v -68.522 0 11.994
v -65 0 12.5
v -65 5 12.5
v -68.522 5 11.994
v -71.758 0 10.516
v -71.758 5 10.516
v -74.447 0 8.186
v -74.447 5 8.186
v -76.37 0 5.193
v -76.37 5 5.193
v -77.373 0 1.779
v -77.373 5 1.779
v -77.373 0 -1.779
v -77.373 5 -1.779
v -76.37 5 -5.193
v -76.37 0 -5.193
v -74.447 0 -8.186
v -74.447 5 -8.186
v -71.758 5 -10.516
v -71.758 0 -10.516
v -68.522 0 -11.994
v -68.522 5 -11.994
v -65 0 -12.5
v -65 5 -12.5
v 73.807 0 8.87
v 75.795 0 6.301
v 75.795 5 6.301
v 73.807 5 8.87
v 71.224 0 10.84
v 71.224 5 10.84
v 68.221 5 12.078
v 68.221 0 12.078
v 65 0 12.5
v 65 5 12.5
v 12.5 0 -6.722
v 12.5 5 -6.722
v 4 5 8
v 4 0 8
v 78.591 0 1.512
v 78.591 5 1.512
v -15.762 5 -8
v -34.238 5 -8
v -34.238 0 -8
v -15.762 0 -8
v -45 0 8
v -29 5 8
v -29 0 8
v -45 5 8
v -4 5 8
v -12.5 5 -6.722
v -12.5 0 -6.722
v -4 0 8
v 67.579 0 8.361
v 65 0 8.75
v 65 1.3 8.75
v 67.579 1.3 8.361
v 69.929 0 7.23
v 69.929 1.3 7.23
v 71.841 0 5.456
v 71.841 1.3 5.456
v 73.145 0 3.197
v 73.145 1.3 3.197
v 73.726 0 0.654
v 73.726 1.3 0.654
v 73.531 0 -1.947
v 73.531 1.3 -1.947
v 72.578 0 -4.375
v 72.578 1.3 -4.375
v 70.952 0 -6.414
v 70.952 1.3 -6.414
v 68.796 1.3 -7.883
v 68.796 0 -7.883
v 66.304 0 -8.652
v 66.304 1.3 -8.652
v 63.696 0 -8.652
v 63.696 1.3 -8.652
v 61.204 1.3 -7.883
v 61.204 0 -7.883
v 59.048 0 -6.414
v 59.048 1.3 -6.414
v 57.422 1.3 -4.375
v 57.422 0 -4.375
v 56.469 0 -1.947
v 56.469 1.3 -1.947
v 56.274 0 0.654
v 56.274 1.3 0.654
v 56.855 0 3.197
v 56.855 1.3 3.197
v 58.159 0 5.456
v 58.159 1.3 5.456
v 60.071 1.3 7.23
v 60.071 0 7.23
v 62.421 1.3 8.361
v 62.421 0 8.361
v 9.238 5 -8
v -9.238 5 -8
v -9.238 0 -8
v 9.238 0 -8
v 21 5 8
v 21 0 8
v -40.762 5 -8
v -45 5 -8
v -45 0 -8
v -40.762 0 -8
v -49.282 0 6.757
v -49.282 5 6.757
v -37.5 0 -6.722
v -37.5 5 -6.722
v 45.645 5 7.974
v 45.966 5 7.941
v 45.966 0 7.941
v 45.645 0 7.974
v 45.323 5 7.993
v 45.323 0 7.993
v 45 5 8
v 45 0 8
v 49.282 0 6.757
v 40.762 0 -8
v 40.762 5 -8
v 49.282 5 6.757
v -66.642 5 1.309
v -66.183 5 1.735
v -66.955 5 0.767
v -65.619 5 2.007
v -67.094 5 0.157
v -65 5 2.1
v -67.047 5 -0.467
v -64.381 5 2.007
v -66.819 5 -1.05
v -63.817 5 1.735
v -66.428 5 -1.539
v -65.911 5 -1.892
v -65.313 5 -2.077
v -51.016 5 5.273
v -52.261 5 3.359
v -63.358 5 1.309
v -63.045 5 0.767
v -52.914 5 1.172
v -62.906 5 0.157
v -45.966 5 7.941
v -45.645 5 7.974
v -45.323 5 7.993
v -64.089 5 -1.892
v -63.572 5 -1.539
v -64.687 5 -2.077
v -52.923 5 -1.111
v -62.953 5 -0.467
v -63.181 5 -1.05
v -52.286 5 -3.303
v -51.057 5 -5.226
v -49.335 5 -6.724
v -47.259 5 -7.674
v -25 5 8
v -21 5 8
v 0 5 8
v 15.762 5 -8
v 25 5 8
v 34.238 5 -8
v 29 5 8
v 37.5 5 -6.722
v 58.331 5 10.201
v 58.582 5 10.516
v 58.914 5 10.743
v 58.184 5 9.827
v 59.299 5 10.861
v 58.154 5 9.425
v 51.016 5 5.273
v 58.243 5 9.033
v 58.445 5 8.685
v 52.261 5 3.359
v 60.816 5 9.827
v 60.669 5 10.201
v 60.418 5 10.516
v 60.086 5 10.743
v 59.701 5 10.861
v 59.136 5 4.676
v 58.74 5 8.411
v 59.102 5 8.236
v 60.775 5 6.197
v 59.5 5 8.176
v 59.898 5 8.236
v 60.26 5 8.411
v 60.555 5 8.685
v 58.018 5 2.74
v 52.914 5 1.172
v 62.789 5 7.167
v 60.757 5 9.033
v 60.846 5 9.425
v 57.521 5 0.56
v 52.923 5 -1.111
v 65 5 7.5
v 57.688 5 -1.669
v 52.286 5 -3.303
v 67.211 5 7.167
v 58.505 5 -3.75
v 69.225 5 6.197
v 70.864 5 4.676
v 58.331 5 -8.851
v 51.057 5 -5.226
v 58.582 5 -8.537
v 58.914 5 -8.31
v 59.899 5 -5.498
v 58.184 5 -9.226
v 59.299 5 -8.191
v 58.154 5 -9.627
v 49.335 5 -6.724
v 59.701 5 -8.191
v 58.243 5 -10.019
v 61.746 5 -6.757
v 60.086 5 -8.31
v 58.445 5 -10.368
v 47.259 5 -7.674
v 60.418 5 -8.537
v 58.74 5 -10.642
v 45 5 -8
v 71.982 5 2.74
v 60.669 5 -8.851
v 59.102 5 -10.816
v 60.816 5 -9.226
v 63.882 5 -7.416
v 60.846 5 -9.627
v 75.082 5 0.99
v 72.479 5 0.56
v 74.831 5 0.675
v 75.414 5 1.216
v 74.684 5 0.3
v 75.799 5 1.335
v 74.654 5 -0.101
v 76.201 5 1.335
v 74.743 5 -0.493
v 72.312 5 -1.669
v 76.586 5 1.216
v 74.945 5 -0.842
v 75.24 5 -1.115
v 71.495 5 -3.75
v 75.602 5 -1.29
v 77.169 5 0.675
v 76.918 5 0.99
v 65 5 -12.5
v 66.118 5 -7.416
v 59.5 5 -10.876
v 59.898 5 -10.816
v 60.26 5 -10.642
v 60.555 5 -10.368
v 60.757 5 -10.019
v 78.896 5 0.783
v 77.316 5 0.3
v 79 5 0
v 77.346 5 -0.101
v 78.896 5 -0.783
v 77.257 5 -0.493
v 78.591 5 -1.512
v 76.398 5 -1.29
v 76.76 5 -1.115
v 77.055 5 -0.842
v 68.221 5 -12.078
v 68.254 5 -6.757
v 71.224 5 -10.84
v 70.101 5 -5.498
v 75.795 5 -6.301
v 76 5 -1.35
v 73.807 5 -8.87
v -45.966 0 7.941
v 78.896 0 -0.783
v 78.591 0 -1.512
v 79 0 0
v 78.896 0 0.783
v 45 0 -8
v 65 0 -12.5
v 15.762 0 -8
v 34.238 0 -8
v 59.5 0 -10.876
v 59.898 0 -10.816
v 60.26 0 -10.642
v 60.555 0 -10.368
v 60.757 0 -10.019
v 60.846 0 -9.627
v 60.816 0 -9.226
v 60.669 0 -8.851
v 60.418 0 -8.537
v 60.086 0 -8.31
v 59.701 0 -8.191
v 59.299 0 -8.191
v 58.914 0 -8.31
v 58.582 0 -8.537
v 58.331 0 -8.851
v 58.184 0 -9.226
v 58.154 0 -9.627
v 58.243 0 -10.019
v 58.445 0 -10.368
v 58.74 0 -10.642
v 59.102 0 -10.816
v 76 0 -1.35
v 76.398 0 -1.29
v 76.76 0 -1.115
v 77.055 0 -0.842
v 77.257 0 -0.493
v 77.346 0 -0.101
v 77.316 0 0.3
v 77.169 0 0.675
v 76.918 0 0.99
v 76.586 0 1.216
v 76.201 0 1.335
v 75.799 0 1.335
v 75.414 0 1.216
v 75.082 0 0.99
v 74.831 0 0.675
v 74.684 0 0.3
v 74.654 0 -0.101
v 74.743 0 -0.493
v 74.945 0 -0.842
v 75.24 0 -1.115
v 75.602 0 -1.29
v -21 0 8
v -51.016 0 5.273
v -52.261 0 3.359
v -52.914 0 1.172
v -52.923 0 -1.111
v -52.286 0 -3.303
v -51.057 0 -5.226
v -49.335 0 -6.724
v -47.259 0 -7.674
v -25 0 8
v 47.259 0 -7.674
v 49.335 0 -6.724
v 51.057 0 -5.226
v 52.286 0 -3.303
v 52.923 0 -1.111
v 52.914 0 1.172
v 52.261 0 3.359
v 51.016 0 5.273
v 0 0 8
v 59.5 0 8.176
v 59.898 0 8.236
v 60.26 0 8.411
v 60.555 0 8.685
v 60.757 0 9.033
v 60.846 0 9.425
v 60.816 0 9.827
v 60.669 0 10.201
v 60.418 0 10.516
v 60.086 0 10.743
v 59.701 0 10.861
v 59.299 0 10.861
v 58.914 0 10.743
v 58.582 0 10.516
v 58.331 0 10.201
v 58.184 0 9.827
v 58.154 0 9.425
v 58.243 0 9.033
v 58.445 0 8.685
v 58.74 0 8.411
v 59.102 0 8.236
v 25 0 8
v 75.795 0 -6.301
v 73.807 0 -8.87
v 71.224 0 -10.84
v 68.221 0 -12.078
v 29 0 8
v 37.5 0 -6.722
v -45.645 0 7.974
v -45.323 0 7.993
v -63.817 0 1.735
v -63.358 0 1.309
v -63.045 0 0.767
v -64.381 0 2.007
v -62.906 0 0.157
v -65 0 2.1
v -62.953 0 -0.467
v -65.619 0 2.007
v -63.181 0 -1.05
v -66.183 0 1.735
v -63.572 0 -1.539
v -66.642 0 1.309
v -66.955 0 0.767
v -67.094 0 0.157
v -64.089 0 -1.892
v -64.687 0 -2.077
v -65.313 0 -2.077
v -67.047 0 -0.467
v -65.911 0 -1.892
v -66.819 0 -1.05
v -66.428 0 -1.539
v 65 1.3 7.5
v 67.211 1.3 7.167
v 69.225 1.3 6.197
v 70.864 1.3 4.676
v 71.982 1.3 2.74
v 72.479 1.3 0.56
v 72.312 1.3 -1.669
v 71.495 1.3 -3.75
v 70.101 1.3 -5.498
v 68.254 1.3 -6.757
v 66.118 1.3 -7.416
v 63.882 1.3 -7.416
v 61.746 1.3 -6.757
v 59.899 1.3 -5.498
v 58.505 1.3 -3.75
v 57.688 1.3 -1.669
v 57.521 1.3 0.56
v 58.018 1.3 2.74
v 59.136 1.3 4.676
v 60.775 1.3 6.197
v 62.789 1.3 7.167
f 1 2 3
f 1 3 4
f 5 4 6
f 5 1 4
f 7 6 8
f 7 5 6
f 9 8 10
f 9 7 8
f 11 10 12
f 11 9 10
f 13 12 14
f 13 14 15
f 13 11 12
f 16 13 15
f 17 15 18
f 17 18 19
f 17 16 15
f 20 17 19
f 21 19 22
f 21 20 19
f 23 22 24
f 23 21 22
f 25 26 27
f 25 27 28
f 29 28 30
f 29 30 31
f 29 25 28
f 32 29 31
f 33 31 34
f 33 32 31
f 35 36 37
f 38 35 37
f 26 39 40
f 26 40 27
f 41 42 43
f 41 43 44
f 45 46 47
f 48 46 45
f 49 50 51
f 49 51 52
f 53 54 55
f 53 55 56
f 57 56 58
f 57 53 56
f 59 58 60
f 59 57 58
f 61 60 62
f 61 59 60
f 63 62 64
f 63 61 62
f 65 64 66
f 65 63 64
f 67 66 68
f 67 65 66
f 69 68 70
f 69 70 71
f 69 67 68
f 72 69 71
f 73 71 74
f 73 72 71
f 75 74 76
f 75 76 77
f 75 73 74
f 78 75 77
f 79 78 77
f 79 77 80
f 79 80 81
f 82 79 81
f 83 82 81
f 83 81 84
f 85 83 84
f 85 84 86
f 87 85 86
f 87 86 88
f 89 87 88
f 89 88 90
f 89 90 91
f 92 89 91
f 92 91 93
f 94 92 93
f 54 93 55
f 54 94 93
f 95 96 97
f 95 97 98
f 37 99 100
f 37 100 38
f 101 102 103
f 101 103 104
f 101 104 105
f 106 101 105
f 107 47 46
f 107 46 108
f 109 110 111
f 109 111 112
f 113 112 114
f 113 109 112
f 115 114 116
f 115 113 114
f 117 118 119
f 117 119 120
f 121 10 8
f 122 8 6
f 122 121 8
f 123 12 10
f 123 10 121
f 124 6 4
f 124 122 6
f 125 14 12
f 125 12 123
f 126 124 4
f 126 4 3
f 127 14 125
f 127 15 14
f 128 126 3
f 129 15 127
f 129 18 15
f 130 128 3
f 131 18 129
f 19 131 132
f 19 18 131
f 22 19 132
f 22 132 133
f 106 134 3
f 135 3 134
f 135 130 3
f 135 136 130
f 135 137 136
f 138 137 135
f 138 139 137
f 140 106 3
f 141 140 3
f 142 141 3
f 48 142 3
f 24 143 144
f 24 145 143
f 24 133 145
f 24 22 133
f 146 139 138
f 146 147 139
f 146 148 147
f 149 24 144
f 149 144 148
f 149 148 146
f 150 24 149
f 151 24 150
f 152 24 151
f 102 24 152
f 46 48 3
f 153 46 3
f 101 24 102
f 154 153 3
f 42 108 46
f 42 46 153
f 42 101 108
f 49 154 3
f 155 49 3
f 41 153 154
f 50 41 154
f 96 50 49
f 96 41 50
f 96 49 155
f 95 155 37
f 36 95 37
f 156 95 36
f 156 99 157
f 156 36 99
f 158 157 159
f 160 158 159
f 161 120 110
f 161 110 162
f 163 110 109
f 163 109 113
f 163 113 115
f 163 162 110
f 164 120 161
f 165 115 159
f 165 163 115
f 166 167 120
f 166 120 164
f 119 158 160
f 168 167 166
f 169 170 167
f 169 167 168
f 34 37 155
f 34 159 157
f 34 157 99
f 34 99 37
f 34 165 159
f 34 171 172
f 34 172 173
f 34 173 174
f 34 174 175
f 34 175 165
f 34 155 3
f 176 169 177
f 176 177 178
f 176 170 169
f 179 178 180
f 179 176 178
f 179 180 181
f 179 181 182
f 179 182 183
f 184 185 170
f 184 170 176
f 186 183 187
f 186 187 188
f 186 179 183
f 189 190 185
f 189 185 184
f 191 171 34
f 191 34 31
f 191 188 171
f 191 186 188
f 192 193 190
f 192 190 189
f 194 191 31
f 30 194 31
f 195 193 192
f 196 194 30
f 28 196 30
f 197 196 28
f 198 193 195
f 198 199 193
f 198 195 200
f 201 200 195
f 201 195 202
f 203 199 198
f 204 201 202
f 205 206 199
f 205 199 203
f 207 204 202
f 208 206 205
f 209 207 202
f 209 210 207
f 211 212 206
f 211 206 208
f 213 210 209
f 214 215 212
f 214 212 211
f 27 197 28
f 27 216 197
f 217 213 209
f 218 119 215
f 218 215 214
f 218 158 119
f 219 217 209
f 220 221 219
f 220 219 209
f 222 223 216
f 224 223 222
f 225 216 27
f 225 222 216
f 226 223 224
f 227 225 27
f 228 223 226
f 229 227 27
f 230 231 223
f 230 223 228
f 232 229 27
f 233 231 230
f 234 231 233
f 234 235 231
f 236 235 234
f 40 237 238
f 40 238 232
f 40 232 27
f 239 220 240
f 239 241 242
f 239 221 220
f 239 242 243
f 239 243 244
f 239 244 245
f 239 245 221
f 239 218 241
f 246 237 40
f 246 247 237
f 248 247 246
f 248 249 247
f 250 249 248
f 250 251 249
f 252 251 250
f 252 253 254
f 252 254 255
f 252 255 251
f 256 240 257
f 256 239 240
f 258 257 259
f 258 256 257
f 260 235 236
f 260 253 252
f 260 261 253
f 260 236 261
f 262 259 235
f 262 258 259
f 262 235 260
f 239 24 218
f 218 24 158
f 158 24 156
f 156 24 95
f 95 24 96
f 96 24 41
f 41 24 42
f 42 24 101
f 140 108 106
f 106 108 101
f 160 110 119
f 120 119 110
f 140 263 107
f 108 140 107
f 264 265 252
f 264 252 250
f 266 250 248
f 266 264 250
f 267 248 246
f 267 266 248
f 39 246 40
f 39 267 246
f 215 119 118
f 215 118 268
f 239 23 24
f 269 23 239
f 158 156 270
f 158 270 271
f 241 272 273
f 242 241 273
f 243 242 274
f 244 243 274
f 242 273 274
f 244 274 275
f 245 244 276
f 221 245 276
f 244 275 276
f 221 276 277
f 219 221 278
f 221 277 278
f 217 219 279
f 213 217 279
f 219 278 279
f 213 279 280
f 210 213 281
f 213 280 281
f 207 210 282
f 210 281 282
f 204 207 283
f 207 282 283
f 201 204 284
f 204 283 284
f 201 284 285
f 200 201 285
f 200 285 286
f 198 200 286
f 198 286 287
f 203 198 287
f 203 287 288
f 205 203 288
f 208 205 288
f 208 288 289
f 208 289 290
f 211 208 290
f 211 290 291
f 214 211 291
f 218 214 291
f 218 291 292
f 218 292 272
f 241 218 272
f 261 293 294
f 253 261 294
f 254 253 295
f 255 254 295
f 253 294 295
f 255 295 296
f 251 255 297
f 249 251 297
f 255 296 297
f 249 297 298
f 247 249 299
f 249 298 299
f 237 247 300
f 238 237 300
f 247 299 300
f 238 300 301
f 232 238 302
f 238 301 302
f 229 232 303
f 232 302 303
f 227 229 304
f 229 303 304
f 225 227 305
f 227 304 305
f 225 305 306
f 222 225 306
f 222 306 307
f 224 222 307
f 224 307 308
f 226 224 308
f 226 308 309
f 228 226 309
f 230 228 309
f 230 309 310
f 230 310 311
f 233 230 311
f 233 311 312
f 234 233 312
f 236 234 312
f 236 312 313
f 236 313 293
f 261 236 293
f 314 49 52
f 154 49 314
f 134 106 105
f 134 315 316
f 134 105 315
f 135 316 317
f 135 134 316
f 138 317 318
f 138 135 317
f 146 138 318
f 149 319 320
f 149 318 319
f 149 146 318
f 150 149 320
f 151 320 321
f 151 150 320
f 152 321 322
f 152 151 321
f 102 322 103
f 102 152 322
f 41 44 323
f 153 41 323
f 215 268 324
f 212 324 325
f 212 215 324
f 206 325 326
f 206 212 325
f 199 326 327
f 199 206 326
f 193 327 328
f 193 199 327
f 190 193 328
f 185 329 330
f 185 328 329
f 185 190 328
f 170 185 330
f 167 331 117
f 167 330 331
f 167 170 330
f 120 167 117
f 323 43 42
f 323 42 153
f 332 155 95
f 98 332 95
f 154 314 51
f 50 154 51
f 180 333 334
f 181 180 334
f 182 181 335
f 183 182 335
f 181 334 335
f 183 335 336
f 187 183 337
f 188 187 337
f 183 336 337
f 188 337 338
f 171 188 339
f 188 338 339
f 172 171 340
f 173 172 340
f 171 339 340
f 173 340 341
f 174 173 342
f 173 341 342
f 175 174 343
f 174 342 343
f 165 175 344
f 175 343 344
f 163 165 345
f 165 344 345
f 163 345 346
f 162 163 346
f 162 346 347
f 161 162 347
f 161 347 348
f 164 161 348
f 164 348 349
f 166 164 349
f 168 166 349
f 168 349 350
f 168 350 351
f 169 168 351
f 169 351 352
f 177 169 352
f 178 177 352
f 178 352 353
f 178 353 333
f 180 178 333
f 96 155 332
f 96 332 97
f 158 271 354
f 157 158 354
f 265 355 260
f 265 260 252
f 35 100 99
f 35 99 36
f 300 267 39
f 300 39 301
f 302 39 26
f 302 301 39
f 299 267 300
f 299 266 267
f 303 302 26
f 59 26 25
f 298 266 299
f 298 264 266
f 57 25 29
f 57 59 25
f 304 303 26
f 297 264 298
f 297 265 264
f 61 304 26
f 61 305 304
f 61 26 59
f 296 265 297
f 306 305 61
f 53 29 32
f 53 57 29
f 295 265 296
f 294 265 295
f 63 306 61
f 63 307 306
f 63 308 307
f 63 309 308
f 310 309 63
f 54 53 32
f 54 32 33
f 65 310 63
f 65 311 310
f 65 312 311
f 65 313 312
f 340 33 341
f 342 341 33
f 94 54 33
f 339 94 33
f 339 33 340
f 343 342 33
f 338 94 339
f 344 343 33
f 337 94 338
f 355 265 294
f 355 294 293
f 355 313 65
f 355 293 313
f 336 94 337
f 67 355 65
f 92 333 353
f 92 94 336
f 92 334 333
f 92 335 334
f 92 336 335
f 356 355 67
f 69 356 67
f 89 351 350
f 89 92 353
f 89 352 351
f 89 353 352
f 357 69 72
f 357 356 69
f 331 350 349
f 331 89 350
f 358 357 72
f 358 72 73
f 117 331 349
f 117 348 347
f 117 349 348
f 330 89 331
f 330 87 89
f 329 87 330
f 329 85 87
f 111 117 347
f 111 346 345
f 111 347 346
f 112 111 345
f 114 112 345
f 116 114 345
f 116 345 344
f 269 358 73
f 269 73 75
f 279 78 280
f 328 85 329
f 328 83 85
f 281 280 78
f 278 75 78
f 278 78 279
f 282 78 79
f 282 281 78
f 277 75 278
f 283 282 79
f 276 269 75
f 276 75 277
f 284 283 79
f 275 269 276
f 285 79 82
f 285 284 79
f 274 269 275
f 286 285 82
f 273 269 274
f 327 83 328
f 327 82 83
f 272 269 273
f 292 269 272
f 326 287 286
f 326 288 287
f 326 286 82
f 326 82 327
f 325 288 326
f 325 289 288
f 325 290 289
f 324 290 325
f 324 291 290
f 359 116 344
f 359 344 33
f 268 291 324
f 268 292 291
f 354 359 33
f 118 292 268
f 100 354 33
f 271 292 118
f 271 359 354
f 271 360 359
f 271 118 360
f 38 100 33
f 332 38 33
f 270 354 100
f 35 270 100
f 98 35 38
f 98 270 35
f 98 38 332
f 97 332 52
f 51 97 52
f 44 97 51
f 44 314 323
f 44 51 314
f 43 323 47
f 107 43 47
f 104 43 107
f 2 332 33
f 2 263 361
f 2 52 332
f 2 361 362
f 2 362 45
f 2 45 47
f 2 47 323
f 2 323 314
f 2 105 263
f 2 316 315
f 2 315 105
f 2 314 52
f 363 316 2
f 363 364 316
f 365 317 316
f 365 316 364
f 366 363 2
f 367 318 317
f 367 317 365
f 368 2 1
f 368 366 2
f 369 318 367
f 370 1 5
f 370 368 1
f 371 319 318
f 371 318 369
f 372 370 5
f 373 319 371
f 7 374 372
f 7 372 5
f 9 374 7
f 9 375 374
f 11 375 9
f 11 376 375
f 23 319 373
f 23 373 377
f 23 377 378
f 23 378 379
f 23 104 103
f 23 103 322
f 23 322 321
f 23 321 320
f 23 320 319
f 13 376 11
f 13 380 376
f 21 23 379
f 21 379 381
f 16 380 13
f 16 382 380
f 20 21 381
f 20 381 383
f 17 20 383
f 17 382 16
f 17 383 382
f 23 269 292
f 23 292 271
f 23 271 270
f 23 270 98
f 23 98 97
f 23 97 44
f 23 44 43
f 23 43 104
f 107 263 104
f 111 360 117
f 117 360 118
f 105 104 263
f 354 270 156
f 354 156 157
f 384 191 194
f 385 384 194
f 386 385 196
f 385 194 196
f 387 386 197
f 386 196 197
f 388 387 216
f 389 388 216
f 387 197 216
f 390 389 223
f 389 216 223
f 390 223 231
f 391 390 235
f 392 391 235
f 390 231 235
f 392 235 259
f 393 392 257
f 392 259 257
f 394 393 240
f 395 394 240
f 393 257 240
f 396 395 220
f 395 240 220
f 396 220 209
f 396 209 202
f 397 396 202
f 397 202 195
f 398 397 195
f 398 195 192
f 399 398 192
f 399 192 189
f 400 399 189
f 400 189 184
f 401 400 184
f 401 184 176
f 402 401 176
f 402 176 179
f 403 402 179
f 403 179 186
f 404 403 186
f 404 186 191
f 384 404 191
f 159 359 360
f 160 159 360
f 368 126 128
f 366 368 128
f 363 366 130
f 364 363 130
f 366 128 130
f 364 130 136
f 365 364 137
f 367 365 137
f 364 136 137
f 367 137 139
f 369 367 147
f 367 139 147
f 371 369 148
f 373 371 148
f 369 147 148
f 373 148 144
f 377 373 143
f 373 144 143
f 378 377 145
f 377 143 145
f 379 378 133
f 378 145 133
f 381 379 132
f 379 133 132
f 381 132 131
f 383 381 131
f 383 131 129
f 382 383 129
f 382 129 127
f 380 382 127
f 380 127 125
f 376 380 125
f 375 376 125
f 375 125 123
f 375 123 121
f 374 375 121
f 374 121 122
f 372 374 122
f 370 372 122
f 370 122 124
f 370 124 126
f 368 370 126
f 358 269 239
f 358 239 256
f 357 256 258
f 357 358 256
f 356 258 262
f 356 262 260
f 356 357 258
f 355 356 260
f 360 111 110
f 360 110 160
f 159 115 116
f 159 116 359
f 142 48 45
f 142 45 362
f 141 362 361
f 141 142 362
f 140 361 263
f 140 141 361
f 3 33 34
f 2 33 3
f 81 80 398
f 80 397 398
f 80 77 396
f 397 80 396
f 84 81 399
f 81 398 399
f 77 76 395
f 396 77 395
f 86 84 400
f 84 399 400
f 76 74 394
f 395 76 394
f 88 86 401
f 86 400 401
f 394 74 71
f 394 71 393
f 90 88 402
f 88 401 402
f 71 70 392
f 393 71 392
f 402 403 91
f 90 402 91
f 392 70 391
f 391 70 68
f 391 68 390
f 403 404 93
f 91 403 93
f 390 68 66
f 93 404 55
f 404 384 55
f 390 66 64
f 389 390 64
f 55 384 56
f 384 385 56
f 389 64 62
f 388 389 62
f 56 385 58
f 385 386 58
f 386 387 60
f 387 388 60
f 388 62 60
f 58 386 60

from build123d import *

# Parameters (mm, degrees)
EXTRUDE_1_DEPTH        = 5
EXTRUDE_5_DEPTH        = 5
CUT_EXTRUDE_2_REACH    = 82.139
SKETCH_7_R             = 7.5
SKETCH_8_R             = 8.75
CUT_EXTRUDE_3_DEPTH    = 1.3
CUT_EXTRUDE_4_REACH    = 82.139
SKETCH_9_R             = 1.35
CUT_EXTRUDE_5_REACH    = 82.139
SKETCH_12_R            = 2.1
CUT_EXTRUDE_6_REACH    = 82.139
EXTRUDE_6_DEPTH        = 5
PATTERN_LINEAR_1_DEPTH = 5


# Read off the part's stored shape, not the designer's step: 阵列(线性)1
with BuildPart() as part:
    # 草图1 → 凸台-拉伸1 (new body)
    with BuildSketch(Plane(origin=(0, 0, 0), x_dir=(1, 0, 0), z_dir=(0, 1, 0))):
        with BuildLine():
            Line((-65, 12.5), (65, 12.5))
            ThreePointArc((65, 12.5), (77.5, 0), (65, -12.5))
            Line((65, -12.5), (-65, -12.5))
            ThreePointArc((-65, -12.5), (-77.5, 0), (-65, 12.5))
        make_face()
    extrude(amount=EXTRUDE_1_DEPTH)

    # 草图10 → 凸台-拉伸5 (add)
    with BuildSketch(Plane.XZ):
        with BuildLine():
            Line((75.795454545, -6.301441197), (78.590909091, -1.512345887))
            ThreePointArc((78.590909091, -1.512345887), (79, 0), (78.590909091, 1.512345887))
            Line((78.590909091, 1.512345887), (75.795454545, 6.301441197))
            Line((75.795454545, 6.301441197), (75.795454545, -6.301441197))
        make_face()
    extrude(amount=-EXTRUDE_5_DEPTH)

    # 草图7 → 切除-拉伸2 (cut, up to next)
    with BuildSketch(Plane(origin=(0, 5, 0), x_dir=(1, 0, 0), z_dir=(0, 1, 0)), mode=Mode.PRIVATE) as cut_extrude_2_sk1:
        with Locations(Location((65, 0, 0), (0, 0, 270))):
            Circle(SKETCH_7_R)
    cut_extrude_2_tool1 = extrude(cut_extrude_2_sk1.sketch, amount=-CUT_EXTRUDE_2_REACH, mode=Mode.PRIVATE) & part.part
    add(cut_extrude_2_tool1.solids().sort_by_distance((65, 5, 0))[0], mode=Mode.SUBTRACT)

    # 草图8 → 切除-拉伸3 (cut)
    with BuildSketch(Plane(origin=(0, 0, 0), x_dir=(1, 0, 0), z_dir=(0, 1, 0))):
        with Locations(Location((65, 0, 0), (0, 0, 270))):
            Circle(SKETCH_8_R)
    extrude(amount=CUT_EXTRUDE_3_DEPTH, mode=Mode.SUBTRACT)

    # 草图9 → 切除-拉伸4 (cut, up to next)
    with BuildSketch(Plane.XZ, mode=Mode.PRIVATE) as cut_extrude_4_sk1:
        with Locations(Location((59.5, 9.526279442, 0), (0, 0, 270))):
            Circle(SKETCH_9_R)
    cut_extrude_4_tool1 = extrude(cut_extrude_4_sk1.sketch, amount=-CUT_EXTRUDE_4_REACH, mode=Mode.PRIVATE) & part.part
    # 草图9 → 切除-拉伸4 (cut, up to next)
    with BuildSketch(Plane.XZ, mode=Mode.PRIVATE) as cut_extrude_4_sk2:
        with Locations(Location((76, 0, 0), (0, 0, 270))):
            Circle(SKETCH_9_R)
    cut_extrude_4_tool2 = extrude(cut_extrude_4_sk2.sketch, amount=-CUT_EXTRUDE_4_REACH, mode=Mode.PRIVATE) & part.part
    # 草图9 → 切除-拉伸4 (cut, up to next)
    with BuildSketch(Plane.XZ, mode=Mode.PRIVATE) as cut_extrude_4_sk3:
        with Locations(Location((59.5, -9.526279442, 0), (0, 0, 270))):
            Circle(SKETCH_9_R)
    cut_extrude_4_tool3 = extrude(cut_extrude_4_sk3.sketch, amount=-CUT_EXTRUDE_4_REACH, mode=Mode.PRIVATE) & part.part
    add(cut_extrude_4_tool1.solids().sort_by_distance((59.5, 0, 9.526279))[0], mode=Mode.SUBTRACT)
    add(cut_extrude_4_tool2.solids().sort_by_distance((76, 0, 0))[0], mode=Mode.SUBTRACT)
    add(cut_extrude_4_tool3.solids().sort_by_distance((59.5, 0, -9.526279))[0], mode=Mode.SUBTRACT)

    # 草图12 → 切除-拉伸5 (cut, up to next)
    with BuildSketch(Plane(origin=(0, 5, 0), x_dir=(1, 0, 0), z_dir=(0, 1, 0)), mode=Mode.PRIVATE) as cut_extrude_5_sk1:
        with Locations(Location((-65, 0, 0), (0, 0, 270))):
            Circle(SKETCH_12_R)
    cut_extrude_5_tool1 = extrude(cut_extrude_5_sk1.sketch, amount=-CUT_EXTRUDE_5_REACH, mode=Mode.PRIVATE) & part.part
    add(cut_extrude_5_tool1.solids().sort_by_distance((-65, 5, 0))[0], mode=Mode.SUBTRACT)

    # 草图13 → 切除-拉伸6 (cut, up to next)
    with BuildSketch(Plane(origin=(0, 5, 0), x_dir=(1, 0, 0), z_dir=(0, 1, 0)), mode=Mode.PRIVATE) as cut_extrude_6_sk1:
        with BuildLine():
            Line((-45, 8), (45, 8))
            ThreePointArc((45, 8), (53, 0), (45, -8))
            Line((45, -8), (-45, -8))
            ThreePointArc((-45, -8), (-53, 0), (-45, 8))
        make_face()
    cut_extrude_6_tool1 = extrude(cut_extrude_6_sk1.sketch, amount=-CUT_EXTRUDE_6_REACH, mode=Mode.PRIVATE) & part.part
    add(cut_extrude_6_tool1.solids().sort_by_distance((0, 5, 0))[0], mode=Mode.SUBTRACT)

    # 草图14 → 凸台-拉伸6 (add)
    with BuildSketch(Plane(origin=(0, 5, 0), x_dir=(1, 0, 0), z_dir=(0, 1, 0))):
        Polygon((0, -8), (9.237604307, 8), (13.237604307, 8), (4, -8), align=None)
    extrude_6 = extrude(amount=-EXTRUDE_6_DEPTH)

    # 阵列(线性)1 outline → 阵列(线性)1 (add)
    with BuildSketch(Plane(origin=(0, 0, 0), x_dir=(1, 0, 0), z_dir=(0, 1, 0))):
        Polygon((38.237604307, 8), (34.237604307, 8), (25, -8), (29, -8), align=None)
        Polygon((-11.762395693, 8), (-15.762395693, 8), (-25, -8), (-21, -8), align=None)
        with BuildLine():
            Line((-45.966190603, -7.941440406), (-36.762395693, 8))
            Line((-36.762395693, 8), (-40.762395693, 8))
            Line((-40.762395693, 8), (-49.282491188, -6.757238284))
            ThreePointArc((-49.282491188, -6.757238284), (-47.690306451, -7.534072683), (-45.966190603, -7.941440406))
        make_face()
    pattern_linear_1 = extrude(amount=PATTERN_LINEAR_1_DEPTH)

    # 镜向1: 凸台-拉伸6, 阵列(线性)1 across plane
    add(extrude_6.mirror(Plane(origin=(0, 0, 0), x_dir=(0, 0, 1), z_dir=(1, 0, 0))))
    add(pattern_linear_1.mirror(Plane(origin=(0, 0, 0), x_dir=(0, 0, 1), z_dir=(1, 0, 0))))


solid = part.part
